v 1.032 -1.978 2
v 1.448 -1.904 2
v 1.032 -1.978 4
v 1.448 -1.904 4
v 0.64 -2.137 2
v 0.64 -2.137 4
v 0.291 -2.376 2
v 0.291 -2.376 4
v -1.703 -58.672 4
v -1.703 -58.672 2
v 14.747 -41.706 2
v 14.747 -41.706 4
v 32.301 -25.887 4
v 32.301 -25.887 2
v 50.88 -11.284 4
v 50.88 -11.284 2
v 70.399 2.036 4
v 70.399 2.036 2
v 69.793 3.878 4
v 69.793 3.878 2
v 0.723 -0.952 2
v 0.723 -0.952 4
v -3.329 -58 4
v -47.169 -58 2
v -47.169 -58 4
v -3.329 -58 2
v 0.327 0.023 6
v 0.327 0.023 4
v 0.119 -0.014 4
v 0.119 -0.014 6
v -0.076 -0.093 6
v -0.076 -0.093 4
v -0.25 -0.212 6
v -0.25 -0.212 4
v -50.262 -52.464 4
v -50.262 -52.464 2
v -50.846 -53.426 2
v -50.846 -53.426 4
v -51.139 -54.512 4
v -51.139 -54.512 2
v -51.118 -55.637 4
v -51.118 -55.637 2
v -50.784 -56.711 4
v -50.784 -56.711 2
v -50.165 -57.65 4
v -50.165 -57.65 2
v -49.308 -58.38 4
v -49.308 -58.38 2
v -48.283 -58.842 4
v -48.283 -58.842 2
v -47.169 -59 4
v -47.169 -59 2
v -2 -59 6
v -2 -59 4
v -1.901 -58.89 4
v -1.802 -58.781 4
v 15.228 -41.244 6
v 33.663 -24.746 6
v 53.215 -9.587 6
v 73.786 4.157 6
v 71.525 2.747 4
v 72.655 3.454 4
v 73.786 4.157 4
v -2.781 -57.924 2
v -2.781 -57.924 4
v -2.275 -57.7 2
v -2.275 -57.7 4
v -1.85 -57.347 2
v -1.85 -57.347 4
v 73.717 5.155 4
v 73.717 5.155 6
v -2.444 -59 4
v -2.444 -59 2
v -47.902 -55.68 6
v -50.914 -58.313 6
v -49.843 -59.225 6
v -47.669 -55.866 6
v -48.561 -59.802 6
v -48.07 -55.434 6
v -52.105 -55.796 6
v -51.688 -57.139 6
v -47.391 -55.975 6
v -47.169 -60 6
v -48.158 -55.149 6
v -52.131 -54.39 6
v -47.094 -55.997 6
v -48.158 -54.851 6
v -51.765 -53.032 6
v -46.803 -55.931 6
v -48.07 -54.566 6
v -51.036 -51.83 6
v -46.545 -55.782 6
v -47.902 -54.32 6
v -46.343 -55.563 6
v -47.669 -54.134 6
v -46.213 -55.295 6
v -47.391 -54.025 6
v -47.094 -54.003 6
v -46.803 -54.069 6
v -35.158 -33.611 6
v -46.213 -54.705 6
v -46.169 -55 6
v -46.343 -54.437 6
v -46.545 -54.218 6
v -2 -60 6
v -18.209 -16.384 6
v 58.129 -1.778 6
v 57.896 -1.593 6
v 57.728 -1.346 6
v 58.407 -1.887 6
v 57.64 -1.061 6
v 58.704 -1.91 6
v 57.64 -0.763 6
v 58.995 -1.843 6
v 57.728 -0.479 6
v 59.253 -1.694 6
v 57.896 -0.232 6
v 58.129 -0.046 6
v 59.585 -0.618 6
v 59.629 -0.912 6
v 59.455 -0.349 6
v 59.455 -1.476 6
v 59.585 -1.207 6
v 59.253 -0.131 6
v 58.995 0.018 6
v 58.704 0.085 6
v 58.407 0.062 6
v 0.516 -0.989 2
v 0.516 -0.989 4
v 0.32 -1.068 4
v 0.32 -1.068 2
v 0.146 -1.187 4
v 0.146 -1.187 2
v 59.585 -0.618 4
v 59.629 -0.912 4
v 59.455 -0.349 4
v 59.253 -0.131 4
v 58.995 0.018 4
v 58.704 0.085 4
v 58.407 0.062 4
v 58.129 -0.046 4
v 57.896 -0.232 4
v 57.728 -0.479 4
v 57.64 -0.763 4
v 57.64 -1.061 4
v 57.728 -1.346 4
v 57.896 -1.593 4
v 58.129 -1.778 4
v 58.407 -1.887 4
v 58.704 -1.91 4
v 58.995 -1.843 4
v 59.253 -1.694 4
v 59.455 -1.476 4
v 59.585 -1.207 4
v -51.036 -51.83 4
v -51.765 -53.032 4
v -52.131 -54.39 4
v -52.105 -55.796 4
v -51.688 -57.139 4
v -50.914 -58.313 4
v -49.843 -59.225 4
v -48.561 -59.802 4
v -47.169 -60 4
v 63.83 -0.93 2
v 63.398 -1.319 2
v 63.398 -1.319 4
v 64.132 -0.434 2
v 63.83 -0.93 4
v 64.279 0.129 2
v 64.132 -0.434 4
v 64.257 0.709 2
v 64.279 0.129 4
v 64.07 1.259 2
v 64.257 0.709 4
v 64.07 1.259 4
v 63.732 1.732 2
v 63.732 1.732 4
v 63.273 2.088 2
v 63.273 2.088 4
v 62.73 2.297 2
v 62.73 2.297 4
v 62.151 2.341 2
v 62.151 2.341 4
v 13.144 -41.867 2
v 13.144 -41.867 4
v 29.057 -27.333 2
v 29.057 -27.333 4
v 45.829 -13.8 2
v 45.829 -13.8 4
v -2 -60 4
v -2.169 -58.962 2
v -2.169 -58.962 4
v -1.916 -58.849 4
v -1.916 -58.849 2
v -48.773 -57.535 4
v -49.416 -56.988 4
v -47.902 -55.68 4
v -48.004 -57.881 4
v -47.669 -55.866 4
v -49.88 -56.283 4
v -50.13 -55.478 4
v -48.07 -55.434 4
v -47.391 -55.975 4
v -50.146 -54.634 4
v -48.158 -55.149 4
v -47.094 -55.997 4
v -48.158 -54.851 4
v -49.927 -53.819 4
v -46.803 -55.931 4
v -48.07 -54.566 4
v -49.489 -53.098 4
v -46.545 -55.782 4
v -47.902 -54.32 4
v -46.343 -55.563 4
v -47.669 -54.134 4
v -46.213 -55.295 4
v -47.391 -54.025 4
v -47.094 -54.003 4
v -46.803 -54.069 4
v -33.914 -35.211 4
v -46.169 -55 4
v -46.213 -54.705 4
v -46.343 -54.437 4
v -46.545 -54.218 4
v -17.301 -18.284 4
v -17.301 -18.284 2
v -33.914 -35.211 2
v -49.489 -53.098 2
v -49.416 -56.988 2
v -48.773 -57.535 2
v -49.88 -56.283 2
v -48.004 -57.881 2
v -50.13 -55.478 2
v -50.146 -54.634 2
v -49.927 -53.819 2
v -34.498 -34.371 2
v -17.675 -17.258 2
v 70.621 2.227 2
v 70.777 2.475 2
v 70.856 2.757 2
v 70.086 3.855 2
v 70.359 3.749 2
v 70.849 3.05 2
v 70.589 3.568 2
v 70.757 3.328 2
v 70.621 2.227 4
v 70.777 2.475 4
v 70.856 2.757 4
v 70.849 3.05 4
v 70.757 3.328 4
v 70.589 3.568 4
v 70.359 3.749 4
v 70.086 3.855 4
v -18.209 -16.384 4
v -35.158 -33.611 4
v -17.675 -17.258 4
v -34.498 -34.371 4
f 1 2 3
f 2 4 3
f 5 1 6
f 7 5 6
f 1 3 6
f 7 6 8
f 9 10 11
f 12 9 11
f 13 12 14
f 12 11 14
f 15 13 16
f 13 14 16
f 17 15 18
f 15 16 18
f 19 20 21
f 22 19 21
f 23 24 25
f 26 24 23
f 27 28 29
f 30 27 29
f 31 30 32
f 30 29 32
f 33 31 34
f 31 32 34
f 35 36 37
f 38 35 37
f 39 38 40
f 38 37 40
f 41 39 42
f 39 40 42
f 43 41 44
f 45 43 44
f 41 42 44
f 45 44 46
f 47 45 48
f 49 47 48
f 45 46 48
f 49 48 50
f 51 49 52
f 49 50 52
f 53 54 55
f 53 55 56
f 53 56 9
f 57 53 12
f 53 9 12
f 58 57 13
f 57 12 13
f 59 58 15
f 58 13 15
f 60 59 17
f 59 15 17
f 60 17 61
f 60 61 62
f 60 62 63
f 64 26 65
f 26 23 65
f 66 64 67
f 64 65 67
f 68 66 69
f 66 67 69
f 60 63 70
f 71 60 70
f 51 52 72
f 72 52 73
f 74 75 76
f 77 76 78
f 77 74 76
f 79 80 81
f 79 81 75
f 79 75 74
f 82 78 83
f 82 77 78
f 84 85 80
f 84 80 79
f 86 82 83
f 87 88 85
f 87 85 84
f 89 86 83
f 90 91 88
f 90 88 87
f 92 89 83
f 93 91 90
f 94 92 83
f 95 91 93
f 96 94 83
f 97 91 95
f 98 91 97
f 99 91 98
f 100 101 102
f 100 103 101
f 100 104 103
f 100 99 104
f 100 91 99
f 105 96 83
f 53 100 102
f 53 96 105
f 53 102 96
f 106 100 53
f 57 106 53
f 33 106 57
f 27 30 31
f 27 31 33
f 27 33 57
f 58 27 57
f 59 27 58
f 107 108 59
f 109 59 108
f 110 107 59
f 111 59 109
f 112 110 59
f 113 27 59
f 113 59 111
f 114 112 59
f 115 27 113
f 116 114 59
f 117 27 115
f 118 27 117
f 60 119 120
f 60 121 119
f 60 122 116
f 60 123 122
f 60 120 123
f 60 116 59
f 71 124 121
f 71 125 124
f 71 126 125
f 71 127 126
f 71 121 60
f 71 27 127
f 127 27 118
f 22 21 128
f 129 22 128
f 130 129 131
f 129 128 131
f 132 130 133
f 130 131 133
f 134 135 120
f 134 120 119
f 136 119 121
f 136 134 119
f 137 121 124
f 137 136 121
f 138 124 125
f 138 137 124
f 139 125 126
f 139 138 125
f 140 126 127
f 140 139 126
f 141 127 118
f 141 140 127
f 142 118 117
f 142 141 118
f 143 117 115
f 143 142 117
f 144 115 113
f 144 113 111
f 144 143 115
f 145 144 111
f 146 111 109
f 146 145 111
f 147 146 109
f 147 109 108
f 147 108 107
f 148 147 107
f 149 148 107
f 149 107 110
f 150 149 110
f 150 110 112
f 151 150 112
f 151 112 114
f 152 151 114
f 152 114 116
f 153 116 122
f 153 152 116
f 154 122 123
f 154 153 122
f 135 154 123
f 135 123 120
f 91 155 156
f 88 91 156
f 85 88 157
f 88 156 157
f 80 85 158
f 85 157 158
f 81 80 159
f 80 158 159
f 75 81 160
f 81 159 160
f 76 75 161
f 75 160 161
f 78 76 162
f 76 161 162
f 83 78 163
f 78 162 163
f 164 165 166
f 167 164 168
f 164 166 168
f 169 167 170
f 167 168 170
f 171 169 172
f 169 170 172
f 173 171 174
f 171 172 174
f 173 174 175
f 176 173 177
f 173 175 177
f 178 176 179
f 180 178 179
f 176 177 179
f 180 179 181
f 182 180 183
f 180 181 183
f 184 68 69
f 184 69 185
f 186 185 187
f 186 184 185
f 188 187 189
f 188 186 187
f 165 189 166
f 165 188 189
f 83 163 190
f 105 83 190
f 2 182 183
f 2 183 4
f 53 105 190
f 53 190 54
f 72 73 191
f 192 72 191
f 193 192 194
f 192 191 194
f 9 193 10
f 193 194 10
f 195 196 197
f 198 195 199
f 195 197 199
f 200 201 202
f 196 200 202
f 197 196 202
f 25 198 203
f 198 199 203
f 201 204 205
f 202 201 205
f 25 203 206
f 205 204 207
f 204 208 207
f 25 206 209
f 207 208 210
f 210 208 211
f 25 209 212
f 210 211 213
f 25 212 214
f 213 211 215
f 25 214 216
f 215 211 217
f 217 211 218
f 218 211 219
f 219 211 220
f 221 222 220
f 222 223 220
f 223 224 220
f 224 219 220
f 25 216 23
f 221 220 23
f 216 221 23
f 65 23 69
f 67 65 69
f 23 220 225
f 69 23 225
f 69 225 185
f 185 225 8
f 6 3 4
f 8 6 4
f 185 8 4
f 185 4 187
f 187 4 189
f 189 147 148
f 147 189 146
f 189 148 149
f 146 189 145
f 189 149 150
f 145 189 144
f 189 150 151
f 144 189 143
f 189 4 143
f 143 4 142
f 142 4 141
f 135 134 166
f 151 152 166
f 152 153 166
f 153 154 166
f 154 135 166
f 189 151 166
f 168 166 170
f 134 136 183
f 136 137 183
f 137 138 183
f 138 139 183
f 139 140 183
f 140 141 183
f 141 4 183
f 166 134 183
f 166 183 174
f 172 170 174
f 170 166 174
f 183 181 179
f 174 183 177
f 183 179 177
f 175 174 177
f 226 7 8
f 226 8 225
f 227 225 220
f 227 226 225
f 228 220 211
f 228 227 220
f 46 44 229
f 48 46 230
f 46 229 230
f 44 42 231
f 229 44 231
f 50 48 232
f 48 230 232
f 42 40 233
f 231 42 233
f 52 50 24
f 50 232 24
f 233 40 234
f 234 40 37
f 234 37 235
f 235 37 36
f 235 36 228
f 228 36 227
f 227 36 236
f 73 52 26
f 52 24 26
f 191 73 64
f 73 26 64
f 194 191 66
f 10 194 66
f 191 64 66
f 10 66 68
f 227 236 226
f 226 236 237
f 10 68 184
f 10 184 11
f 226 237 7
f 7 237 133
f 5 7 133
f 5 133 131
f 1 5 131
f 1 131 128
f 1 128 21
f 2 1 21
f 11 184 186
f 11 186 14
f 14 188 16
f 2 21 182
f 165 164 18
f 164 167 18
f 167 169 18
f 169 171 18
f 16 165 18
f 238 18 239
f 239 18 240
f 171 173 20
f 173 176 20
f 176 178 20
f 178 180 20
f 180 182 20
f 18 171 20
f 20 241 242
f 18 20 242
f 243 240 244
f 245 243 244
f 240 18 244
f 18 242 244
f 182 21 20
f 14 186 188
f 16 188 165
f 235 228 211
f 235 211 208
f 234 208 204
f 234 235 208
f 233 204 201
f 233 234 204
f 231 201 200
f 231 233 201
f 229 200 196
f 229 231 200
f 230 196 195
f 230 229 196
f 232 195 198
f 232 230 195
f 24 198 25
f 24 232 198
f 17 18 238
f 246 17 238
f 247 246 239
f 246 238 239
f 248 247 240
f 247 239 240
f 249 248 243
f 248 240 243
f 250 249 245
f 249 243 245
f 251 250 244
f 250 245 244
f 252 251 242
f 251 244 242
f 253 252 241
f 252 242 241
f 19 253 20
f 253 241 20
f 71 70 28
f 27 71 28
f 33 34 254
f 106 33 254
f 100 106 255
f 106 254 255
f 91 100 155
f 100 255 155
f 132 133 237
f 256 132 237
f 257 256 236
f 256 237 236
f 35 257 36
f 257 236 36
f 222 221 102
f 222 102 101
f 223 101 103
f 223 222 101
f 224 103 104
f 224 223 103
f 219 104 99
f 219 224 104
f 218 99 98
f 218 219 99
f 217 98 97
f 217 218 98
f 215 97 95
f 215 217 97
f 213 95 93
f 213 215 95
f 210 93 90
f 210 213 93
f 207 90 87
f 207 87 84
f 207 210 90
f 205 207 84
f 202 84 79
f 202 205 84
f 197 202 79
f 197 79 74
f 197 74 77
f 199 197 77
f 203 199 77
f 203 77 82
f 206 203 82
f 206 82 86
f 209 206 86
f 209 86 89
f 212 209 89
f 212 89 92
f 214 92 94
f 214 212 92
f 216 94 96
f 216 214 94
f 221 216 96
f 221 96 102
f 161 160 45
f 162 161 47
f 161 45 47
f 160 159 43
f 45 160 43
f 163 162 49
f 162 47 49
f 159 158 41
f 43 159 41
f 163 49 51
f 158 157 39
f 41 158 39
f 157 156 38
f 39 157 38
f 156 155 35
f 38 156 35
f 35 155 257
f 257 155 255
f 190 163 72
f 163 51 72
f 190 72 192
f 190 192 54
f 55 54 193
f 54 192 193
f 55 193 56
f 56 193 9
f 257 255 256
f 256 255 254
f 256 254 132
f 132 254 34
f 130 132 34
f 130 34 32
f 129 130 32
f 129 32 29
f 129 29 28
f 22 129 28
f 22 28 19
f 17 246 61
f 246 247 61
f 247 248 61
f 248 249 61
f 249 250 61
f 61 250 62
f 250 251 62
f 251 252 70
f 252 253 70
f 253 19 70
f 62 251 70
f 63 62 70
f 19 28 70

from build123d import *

# Parameters (mm, degrees)
BOSS_EXTRUDE2_DEPTH = 2
SKETCH7_R           = 1
BOSS_EXTRUDE3_DEPTH = 2
FILLET1_R           = 2


with BuildPart() as part:
    # Sketch6 → Boss-Extrude2 (new body)
    with BuildSketch(Plane.XY.offset(2)):
        with BuildLine():
            Line((-47.16876351, -59), (-2.443648629, -59))
            ThreePointArc((-2.443648629, -59), (-2.038405947, -58.914209149), (-1.702695493, -58.671556736))
            ThreePointArc((-1.702695493, -58.671556736), (32.301028127, -25.886609728), (70.398776732, 2.035917408))
            ThreePointArc((70.398776732, 2.035917408), (70.813266743, 3.192601161), (69.793484422, 3.877993962))
            Line((69.793484422, 3.877993962), (0.723267865, -0.951866082))
            ThreePointArc((0.723267865, -0.951866082), (0.415830952, -1.023295613), (0.145969905, -1.186986325))
            ThreePointArc((0.145969905, -1.186986325), (-26.215640884, -25.687788129), (-50.262327585, -52.46428288))
            ThreePointArc((-50.262327585, -52.46428288), (-50.784207361, -56.711305279), (-47.16876351, -59))
        make_face()
        with BuildLine():
            Line((-47.16876351, -58), (-2.443648629, -58))
            ThreePointArc((-2.443648629, -58), (31.656951696, -25.121648584), (69.863240895, 2.880429912))
            Line((69.863240895, 2.880429912), (0.793024339, -1.949430132))
            ThreePointArc((0.793024339, -1.949430132), (-25.502517251, -26.388826418), (-49.488936566, -53.09821216))
            ThreePointArc((-49.488936566, -53.09821216), (-49.880346398, -56.28347896), (-47.16876351, -58))
        make_face(mode=Mode.SUBTRACT)
    extrude(amount=BOSS_EXTRUDE2_DEPTH)

    # Sketch7 → Boss-Extrude3 (add)
    with BuildSketch(Plane.XY.offset(4)):
        with BuildLine():
            Line((73.71668331, 5.154772651), (0.326528995, 0.022833132))
            ThreePointArc((0.326528995, 0.022833132), (0.019473004, -0.048441349), (-0.250141607, -0.211755142))
            ThreePointArc((-0.250141607, -0.211755142), (-26.813414366, -24.869459397), (-51.035718603, -51.8303536))
            ThreePointArc((-51.035718603, -51.8303536), (-51.688068324, -57.139131599), (-47.16876351, -60))
            Line((-47.16876351, -60), (-2, -60))
            Line((-2, -60), (-2, -59))
            ThreePointArc((-2, -59), (33.663262979, -24.745525454), (73.786439783, 4.157208601))
            Line((73.786439783, 4.157208601), (73.71668331, 5.154772651))
        make_face()
        with Locations((58.629217017, -0.912455258)):
            Circle(SKETCH7_R, mode=Mode.SUBTRACT)
        with Locations((-47.16876351, -55)):
            Circle(SKETCH7_R, mode=Mode.SUBTRACT)
    extrude(amount=BOSS_EXTRUDE3_DEPTH)

    # Fillet1
    fillet1_edges = [part.edges().sort_by_distance(p)[0] for p in [
        (69.863240895, 2.880429912, 3),
        (0.793024339, -1.949430132, 3),
        (-2.443648629, -58, 3),
    ]]
    fillet(fillet1_edges, radius=FILLET1_R)


solid = part.part
